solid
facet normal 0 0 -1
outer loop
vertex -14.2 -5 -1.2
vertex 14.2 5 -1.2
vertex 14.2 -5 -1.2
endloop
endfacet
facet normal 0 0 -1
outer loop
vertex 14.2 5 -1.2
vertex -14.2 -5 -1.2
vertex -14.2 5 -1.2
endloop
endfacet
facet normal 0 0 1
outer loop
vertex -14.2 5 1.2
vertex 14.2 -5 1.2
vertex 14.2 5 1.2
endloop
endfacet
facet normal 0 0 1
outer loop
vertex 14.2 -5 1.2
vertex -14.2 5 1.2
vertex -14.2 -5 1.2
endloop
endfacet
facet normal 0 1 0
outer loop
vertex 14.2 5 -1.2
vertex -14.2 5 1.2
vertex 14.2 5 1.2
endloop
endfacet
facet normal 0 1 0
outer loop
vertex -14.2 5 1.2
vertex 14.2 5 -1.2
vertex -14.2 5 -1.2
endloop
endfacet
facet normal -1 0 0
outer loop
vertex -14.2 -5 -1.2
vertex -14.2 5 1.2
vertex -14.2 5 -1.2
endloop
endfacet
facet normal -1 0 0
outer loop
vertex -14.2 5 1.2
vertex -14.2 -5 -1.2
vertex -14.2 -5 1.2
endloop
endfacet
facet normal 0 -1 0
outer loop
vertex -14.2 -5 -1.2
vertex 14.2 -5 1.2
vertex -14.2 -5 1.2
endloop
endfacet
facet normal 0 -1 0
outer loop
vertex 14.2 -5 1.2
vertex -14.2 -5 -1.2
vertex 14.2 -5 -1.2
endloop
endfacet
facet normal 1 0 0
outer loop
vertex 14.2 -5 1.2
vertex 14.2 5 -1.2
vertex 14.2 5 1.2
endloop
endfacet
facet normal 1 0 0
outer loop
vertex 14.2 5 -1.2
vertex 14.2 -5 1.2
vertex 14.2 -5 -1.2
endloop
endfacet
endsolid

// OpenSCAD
// file: ../p/box.scad
use <../lib.scad>
function ldraw_lib__box() = [
// 0 Box 6 (six faces)
// 0 Name: box.dat
// 0 Author: James Jessiman
// 0 !LDRAW_ORG Primitive UPDATE 2002-05
// 0 !LICENSE Licensed under CC BY 4.0 : see CAreadme.txt
// 
// 0 BFC CERTIFY CCW
  [0,"BFC","CERTIFY"],
  [0,"BFC","CCW"],
// 
// 0 !HISTORY 2002-08-22 [sbliss] Applied BFC
// 0 !HISTORY 2002-11-30 [PTadmin] Official Update 2002-05
// 0 !HISTORY 2007-06-24 [PTadmin] Header formatted for Contributor Agreement
// 0 !HISTORY 2008-07-01 [PTadmin] Official Update 2008-01
// 
// 
// 2 24 1 1 1 -1 1 1
  [2,24,1,1,1,-1,1,1],
// 2 24 -1 1 1 -1 1 -1
  [2,24,-1,1,1,-1,1,-1],
// 2 24 -1 1 -1 1 1 -1
  [2,24,-1,1,-1,1,1,-1],
// 2 24 1 1 -1 1 1 1
  [2,24,1,1,-1,1,1,1],
// 2 24 1 -1 1 -1 -1 1
  [2,24,1,-1,1,-1,-1,1],
// 2 24 -1 -1 1 -1 -1 -1
  [2,24,-1,-1,1,-1,-1,-1],
// 2 24 -1 -1 -1 1 -1 -1
  [2,24,-1,-1,-1,1,-1,-1],
// 2 24 1 -1 -1 1 -1 1
  [2,24,1,-1,-1,1,-1,1],
// 2 24 1 -1 1 1 1 1
  [2,24,1,-1,1,1,1,1],
// 2 24 -1 -1 1 -1 1 1
  [2,24,-1,-1,1,-1,1,1],
// 2 24 1 -1 -1 1 1 -1
  [2,24,1,-1,-1,1,1,-1],
// 2 24 -1 -1 -1 -1 1 -1
  [2,24,-1,-1,-1,-1,1,-1],
// 4 16 1 1 1 1 1 -1 -1 1 -1 -1 1 1
  [4,16,1,1,1,1,1,-1,-1,1,-1,-1,1,1],
// 4 16 -1 -1 -1 1 -1 -1 1 -1 1 -1 -1 1
  [4,16,-1,-1,-1,1,-1,-1,1,-1,1,-1,-1,1],
// 4 16 -1 -1 1 1 -1 1 1 1 1 -1 1 1
  [4,16,-1,-1,1,1,-1,1,1,1,1,-1,1,1],
// 4 16 -1 -1 -1 -1 -1 1 -1 1 1 -1 1 -1
  [4,16,-1,-1,-1,-1,-1,1,-1,1,1,-1,1,-1],
// 4 16 1 -1 -1 -1 -1 -1 -1 1 -1 1 1 -1
  [4,16,1,-1,-1,-1,-1,-1,-1,1,-1,1,1,-1],
// 4 16 1 -1 1 1 -1 -1 1 1 -1 1 1 1
  [4,16,1,-1,1,1,-1,-1,1,1,-1,1,1,1],
// 0
];
module ldraw_lib__box(step=0, col=false, unit=2/5, alt=false, line=0.2, solid=!$preview)
    makepoly(ldraw_lib__box(), step=step, col=col, unit=unit, alt=alt, line=line, solid=solid);
ldraw_lib__box(line=0.2);
// main file
use <../lib.scad>
use <../p/box.scad>
function ldraw_lib__u9580() = [
// 0 ~Train Brick  2 x  4 x  1.333 Sliding Wheel Block - Weight
// 0 Name: u9580.dat
// 0 Author: Gerald Lasser [GeraldLasser]
// 0 !LDRAW_ORG Part UPDATE 2024-06
// 0 !LICENSE Licensed under CC BY 4.0 : see CAreadme.txt
// 
// 0 BFC CERTIFY CCW
  [0,"BFC","CERTIFY"],
  [0,"BFC","CCW"],
// 
// 0 !HISTORY 2024-07-29 [OrionP] Official Update 2024-06
// 
// 
// 1 16 0 0 0 35.5 0 0 0 3 0 0 0 12.5 box.dat
  [1,16,0,0,0,35.5,0,0,0,3,0,0,0,12.5, ldraw_lib__box()],
];
module ldraw_lib__u9580(step=0, col=false, unit=2/5, alt=false, line=0.2, solid=!$preview)
    makepoly(ldraw_lib__u9580(), step=step, col=col, unit=unit, alt=alt, line=line, solid=solid);
ldraw_lib__u9580(line=0.2);
